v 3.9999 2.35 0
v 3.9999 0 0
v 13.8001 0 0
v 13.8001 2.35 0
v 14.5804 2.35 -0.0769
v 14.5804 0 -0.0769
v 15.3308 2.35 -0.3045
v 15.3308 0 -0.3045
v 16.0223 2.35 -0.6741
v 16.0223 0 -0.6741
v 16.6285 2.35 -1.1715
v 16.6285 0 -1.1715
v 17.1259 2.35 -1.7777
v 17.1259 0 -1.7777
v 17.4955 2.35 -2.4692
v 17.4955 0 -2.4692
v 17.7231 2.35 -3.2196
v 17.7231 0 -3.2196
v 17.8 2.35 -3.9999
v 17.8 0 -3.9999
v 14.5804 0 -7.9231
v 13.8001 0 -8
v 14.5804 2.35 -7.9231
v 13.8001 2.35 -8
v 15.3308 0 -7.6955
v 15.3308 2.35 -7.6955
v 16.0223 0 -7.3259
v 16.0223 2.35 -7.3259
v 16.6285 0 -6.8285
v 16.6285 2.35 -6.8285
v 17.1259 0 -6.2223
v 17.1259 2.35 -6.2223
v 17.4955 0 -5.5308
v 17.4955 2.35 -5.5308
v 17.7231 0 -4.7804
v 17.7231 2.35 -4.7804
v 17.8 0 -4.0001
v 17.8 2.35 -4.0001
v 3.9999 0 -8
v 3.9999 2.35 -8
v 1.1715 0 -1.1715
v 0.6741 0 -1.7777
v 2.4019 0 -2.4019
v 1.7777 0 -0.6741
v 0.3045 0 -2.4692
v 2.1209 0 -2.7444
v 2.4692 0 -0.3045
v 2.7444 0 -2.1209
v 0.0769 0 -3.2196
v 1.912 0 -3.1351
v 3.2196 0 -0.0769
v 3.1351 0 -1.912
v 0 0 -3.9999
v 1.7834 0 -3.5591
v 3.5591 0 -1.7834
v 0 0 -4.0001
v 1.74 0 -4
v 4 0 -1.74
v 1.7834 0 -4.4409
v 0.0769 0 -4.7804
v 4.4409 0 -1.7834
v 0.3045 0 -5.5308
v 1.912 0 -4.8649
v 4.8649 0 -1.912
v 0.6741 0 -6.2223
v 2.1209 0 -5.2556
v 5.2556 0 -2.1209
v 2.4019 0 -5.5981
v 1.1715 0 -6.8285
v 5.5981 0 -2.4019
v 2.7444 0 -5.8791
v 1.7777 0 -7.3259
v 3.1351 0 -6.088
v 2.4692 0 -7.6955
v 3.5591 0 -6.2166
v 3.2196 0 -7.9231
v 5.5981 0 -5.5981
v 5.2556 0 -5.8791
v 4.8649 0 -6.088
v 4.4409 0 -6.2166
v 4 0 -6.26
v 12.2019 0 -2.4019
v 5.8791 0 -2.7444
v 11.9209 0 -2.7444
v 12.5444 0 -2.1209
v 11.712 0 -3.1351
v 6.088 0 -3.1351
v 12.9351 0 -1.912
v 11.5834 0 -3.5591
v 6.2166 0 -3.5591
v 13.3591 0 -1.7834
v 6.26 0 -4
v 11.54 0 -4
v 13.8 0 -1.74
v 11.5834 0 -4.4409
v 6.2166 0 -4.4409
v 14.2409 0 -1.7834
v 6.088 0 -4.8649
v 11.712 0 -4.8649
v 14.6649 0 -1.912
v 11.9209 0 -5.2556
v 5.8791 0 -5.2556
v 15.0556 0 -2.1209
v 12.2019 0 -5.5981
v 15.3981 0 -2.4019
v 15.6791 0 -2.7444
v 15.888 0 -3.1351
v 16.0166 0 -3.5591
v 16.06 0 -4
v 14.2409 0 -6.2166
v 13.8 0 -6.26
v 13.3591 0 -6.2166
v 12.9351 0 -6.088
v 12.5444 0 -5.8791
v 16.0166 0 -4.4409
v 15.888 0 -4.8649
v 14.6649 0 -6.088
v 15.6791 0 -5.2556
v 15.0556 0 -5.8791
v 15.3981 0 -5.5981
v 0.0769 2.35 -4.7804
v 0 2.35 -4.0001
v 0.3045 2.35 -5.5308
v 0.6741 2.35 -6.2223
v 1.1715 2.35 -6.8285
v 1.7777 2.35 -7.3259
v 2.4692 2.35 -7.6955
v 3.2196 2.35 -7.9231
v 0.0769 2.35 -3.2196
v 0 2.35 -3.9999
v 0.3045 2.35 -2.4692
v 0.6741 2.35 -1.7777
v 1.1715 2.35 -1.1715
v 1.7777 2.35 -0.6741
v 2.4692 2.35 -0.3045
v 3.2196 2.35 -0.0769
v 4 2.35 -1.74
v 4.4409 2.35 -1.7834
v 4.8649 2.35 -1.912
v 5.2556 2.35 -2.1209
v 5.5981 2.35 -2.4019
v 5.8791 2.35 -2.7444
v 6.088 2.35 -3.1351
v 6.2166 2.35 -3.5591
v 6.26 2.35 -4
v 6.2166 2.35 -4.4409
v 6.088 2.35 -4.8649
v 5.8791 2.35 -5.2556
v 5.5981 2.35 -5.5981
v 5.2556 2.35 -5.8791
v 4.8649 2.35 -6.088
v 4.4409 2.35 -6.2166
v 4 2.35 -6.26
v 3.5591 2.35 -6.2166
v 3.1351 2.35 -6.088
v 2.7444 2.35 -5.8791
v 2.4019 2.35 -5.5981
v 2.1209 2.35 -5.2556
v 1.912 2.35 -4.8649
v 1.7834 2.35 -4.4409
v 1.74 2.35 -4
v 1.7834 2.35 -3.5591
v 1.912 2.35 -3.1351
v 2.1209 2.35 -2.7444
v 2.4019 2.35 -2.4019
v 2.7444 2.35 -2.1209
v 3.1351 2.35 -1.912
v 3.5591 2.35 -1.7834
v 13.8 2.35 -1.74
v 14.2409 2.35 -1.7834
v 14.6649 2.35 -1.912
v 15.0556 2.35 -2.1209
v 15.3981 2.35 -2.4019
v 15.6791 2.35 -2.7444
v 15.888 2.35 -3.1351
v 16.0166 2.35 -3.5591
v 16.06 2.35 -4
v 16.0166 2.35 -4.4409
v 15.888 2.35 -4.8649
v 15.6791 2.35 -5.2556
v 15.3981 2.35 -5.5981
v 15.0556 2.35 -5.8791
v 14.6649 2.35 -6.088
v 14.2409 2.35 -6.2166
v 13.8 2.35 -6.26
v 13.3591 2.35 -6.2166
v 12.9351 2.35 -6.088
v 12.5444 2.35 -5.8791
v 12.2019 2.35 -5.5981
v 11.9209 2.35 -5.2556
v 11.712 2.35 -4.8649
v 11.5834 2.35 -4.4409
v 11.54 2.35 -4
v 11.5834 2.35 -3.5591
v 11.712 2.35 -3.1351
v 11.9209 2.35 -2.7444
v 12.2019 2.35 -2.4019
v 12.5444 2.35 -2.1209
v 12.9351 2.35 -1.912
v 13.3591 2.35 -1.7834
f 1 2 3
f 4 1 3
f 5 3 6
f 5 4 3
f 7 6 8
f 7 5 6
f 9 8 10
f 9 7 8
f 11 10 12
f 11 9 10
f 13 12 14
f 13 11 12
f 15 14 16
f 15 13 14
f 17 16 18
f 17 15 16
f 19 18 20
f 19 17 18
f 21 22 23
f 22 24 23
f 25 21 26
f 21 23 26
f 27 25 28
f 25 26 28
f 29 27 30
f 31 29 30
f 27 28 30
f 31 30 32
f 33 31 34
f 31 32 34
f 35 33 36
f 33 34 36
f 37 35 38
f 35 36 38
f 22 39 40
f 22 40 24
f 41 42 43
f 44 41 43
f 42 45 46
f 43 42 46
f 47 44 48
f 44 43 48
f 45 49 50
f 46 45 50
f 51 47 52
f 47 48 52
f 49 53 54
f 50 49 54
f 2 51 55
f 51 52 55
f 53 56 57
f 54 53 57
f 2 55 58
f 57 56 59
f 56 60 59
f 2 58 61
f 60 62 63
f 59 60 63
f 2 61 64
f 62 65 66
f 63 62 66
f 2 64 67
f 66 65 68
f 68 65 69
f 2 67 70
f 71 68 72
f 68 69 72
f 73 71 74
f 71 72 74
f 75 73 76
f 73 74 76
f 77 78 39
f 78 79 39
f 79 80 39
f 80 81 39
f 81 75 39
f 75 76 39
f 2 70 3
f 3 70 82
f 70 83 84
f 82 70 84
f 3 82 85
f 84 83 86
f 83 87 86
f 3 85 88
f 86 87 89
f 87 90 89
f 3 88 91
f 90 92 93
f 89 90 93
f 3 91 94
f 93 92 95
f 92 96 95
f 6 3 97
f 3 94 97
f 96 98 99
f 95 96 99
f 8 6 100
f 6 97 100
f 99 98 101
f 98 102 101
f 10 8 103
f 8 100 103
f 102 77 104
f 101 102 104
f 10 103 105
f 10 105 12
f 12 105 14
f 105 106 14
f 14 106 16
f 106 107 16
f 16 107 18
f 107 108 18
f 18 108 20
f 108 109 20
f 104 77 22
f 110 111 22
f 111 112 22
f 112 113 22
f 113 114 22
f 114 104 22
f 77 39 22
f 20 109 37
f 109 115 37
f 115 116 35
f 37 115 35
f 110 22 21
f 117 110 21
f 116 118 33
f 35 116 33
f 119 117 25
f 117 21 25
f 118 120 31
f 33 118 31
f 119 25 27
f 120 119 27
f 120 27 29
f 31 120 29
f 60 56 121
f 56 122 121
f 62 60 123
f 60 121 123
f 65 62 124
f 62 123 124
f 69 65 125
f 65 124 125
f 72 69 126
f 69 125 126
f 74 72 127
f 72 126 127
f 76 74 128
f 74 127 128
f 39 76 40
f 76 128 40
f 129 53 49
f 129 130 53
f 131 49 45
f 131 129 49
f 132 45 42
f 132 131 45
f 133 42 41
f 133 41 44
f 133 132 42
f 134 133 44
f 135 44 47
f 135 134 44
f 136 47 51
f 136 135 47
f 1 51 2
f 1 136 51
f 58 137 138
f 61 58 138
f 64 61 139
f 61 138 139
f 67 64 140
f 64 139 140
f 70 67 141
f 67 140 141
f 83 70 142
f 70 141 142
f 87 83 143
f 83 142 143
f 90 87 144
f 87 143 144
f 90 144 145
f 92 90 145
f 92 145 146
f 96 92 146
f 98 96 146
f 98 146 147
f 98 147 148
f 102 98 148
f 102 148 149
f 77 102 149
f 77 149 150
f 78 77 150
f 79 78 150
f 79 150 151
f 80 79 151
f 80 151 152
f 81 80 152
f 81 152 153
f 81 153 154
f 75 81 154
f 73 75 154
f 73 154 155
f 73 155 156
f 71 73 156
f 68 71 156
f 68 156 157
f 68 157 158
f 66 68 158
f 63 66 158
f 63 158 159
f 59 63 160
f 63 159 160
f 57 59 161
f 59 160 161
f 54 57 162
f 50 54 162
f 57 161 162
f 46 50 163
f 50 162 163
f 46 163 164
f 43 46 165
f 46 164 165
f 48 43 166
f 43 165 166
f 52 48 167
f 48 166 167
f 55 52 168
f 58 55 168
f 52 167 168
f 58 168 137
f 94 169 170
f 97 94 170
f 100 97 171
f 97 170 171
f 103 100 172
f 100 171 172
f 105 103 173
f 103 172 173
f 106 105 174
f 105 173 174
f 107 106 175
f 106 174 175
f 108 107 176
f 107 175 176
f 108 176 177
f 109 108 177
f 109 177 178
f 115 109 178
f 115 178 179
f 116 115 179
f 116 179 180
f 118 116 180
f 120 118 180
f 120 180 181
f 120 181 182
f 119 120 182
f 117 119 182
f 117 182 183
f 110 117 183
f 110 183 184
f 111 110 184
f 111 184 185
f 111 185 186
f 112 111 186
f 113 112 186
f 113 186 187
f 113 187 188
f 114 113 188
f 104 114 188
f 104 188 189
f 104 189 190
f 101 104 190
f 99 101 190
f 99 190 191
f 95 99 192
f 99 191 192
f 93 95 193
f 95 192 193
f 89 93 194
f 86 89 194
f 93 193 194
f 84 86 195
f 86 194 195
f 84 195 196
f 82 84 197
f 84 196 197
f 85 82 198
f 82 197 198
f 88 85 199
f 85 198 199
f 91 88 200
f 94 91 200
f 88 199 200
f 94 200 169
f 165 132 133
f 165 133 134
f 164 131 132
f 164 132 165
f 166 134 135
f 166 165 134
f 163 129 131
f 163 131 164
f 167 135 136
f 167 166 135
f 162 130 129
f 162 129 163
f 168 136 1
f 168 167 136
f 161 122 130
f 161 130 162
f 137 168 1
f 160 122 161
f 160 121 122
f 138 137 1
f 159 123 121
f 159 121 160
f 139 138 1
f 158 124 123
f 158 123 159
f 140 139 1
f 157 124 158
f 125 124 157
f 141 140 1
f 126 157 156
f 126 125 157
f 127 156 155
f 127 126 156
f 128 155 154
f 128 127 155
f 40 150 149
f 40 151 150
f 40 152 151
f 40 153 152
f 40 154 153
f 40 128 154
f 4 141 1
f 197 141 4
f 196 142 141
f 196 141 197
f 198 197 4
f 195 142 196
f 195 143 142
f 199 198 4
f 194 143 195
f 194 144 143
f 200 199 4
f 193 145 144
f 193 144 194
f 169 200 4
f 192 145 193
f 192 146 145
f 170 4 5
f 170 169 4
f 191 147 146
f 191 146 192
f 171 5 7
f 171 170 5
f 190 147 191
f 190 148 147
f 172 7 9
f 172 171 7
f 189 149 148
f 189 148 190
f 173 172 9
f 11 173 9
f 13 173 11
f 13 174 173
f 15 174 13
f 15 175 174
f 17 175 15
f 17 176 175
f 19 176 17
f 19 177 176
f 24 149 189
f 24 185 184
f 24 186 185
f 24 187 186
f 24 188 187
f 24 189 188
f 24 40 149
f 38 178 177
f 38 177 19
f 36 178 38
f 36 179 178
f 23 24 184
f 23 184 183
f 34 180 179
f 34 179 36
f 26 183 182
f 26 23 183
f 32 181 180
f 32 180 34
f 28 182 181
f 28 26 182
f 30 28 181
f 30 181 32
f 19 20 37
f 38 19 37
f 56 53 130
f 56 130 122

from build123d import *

# Parameters (mm, degrees)
SKETCH1_W           = 17.8
SKETCH1_H           = 8
BOSS_EXTRUDE1_DEPTH = 2.35
SKETCH2_R           = 2.26
CUT_EXTRUDE1_DEPTH  = 20.656105922
FILLET1_R           = 4


with BuildPart() as part:
    # Sketch1 → Boss-Extrude1 (new body)
    with BuildSketch(Plane(origin=(0, 0, 0), x_dir=(1, 0, 0), z_dir=(0, 1, 0))):
        with Locations((8.9, 4)):
            Rectangle(SKETCH1_W, SKETCH1_H)
    extrude(amount=BOSS_EXTRUDE1_DEPTH)

    # Sketch2 → Cut-Extrude1 (cut, through all)
    with BuildSketch(Plane(origin=(0, 2.35, 0), x_dir=(1, 0, 0), z_dir=(0, 1, 0))):
        with Locations(Location((4, 4, 0), (0, 0, 270))):
            Circle(SKETCH2_R)
        with Locations(Location((13.8, 4, 0), (0, 0, 270))):
            Circle(SKETCH2_R)
    extrude(amount=-CUT_EXTRUDE1_DEPTH, mode=Mode.SUBTRACT)

    # Fillet1
    fillet1_edges = [part.edges().sort_by_distance(p)[0] for p in [
        (17.8, 1.175, 0),
        (0, 1.175, 0),
        (17.8, 1.175, -8),
        (0, 1.175, -8),
    ]]
    fillet(fillet1_edges, radius=FILLET1_R - 0.0001)  # a hair under: the kernel refuses the full size


solid = part.part
